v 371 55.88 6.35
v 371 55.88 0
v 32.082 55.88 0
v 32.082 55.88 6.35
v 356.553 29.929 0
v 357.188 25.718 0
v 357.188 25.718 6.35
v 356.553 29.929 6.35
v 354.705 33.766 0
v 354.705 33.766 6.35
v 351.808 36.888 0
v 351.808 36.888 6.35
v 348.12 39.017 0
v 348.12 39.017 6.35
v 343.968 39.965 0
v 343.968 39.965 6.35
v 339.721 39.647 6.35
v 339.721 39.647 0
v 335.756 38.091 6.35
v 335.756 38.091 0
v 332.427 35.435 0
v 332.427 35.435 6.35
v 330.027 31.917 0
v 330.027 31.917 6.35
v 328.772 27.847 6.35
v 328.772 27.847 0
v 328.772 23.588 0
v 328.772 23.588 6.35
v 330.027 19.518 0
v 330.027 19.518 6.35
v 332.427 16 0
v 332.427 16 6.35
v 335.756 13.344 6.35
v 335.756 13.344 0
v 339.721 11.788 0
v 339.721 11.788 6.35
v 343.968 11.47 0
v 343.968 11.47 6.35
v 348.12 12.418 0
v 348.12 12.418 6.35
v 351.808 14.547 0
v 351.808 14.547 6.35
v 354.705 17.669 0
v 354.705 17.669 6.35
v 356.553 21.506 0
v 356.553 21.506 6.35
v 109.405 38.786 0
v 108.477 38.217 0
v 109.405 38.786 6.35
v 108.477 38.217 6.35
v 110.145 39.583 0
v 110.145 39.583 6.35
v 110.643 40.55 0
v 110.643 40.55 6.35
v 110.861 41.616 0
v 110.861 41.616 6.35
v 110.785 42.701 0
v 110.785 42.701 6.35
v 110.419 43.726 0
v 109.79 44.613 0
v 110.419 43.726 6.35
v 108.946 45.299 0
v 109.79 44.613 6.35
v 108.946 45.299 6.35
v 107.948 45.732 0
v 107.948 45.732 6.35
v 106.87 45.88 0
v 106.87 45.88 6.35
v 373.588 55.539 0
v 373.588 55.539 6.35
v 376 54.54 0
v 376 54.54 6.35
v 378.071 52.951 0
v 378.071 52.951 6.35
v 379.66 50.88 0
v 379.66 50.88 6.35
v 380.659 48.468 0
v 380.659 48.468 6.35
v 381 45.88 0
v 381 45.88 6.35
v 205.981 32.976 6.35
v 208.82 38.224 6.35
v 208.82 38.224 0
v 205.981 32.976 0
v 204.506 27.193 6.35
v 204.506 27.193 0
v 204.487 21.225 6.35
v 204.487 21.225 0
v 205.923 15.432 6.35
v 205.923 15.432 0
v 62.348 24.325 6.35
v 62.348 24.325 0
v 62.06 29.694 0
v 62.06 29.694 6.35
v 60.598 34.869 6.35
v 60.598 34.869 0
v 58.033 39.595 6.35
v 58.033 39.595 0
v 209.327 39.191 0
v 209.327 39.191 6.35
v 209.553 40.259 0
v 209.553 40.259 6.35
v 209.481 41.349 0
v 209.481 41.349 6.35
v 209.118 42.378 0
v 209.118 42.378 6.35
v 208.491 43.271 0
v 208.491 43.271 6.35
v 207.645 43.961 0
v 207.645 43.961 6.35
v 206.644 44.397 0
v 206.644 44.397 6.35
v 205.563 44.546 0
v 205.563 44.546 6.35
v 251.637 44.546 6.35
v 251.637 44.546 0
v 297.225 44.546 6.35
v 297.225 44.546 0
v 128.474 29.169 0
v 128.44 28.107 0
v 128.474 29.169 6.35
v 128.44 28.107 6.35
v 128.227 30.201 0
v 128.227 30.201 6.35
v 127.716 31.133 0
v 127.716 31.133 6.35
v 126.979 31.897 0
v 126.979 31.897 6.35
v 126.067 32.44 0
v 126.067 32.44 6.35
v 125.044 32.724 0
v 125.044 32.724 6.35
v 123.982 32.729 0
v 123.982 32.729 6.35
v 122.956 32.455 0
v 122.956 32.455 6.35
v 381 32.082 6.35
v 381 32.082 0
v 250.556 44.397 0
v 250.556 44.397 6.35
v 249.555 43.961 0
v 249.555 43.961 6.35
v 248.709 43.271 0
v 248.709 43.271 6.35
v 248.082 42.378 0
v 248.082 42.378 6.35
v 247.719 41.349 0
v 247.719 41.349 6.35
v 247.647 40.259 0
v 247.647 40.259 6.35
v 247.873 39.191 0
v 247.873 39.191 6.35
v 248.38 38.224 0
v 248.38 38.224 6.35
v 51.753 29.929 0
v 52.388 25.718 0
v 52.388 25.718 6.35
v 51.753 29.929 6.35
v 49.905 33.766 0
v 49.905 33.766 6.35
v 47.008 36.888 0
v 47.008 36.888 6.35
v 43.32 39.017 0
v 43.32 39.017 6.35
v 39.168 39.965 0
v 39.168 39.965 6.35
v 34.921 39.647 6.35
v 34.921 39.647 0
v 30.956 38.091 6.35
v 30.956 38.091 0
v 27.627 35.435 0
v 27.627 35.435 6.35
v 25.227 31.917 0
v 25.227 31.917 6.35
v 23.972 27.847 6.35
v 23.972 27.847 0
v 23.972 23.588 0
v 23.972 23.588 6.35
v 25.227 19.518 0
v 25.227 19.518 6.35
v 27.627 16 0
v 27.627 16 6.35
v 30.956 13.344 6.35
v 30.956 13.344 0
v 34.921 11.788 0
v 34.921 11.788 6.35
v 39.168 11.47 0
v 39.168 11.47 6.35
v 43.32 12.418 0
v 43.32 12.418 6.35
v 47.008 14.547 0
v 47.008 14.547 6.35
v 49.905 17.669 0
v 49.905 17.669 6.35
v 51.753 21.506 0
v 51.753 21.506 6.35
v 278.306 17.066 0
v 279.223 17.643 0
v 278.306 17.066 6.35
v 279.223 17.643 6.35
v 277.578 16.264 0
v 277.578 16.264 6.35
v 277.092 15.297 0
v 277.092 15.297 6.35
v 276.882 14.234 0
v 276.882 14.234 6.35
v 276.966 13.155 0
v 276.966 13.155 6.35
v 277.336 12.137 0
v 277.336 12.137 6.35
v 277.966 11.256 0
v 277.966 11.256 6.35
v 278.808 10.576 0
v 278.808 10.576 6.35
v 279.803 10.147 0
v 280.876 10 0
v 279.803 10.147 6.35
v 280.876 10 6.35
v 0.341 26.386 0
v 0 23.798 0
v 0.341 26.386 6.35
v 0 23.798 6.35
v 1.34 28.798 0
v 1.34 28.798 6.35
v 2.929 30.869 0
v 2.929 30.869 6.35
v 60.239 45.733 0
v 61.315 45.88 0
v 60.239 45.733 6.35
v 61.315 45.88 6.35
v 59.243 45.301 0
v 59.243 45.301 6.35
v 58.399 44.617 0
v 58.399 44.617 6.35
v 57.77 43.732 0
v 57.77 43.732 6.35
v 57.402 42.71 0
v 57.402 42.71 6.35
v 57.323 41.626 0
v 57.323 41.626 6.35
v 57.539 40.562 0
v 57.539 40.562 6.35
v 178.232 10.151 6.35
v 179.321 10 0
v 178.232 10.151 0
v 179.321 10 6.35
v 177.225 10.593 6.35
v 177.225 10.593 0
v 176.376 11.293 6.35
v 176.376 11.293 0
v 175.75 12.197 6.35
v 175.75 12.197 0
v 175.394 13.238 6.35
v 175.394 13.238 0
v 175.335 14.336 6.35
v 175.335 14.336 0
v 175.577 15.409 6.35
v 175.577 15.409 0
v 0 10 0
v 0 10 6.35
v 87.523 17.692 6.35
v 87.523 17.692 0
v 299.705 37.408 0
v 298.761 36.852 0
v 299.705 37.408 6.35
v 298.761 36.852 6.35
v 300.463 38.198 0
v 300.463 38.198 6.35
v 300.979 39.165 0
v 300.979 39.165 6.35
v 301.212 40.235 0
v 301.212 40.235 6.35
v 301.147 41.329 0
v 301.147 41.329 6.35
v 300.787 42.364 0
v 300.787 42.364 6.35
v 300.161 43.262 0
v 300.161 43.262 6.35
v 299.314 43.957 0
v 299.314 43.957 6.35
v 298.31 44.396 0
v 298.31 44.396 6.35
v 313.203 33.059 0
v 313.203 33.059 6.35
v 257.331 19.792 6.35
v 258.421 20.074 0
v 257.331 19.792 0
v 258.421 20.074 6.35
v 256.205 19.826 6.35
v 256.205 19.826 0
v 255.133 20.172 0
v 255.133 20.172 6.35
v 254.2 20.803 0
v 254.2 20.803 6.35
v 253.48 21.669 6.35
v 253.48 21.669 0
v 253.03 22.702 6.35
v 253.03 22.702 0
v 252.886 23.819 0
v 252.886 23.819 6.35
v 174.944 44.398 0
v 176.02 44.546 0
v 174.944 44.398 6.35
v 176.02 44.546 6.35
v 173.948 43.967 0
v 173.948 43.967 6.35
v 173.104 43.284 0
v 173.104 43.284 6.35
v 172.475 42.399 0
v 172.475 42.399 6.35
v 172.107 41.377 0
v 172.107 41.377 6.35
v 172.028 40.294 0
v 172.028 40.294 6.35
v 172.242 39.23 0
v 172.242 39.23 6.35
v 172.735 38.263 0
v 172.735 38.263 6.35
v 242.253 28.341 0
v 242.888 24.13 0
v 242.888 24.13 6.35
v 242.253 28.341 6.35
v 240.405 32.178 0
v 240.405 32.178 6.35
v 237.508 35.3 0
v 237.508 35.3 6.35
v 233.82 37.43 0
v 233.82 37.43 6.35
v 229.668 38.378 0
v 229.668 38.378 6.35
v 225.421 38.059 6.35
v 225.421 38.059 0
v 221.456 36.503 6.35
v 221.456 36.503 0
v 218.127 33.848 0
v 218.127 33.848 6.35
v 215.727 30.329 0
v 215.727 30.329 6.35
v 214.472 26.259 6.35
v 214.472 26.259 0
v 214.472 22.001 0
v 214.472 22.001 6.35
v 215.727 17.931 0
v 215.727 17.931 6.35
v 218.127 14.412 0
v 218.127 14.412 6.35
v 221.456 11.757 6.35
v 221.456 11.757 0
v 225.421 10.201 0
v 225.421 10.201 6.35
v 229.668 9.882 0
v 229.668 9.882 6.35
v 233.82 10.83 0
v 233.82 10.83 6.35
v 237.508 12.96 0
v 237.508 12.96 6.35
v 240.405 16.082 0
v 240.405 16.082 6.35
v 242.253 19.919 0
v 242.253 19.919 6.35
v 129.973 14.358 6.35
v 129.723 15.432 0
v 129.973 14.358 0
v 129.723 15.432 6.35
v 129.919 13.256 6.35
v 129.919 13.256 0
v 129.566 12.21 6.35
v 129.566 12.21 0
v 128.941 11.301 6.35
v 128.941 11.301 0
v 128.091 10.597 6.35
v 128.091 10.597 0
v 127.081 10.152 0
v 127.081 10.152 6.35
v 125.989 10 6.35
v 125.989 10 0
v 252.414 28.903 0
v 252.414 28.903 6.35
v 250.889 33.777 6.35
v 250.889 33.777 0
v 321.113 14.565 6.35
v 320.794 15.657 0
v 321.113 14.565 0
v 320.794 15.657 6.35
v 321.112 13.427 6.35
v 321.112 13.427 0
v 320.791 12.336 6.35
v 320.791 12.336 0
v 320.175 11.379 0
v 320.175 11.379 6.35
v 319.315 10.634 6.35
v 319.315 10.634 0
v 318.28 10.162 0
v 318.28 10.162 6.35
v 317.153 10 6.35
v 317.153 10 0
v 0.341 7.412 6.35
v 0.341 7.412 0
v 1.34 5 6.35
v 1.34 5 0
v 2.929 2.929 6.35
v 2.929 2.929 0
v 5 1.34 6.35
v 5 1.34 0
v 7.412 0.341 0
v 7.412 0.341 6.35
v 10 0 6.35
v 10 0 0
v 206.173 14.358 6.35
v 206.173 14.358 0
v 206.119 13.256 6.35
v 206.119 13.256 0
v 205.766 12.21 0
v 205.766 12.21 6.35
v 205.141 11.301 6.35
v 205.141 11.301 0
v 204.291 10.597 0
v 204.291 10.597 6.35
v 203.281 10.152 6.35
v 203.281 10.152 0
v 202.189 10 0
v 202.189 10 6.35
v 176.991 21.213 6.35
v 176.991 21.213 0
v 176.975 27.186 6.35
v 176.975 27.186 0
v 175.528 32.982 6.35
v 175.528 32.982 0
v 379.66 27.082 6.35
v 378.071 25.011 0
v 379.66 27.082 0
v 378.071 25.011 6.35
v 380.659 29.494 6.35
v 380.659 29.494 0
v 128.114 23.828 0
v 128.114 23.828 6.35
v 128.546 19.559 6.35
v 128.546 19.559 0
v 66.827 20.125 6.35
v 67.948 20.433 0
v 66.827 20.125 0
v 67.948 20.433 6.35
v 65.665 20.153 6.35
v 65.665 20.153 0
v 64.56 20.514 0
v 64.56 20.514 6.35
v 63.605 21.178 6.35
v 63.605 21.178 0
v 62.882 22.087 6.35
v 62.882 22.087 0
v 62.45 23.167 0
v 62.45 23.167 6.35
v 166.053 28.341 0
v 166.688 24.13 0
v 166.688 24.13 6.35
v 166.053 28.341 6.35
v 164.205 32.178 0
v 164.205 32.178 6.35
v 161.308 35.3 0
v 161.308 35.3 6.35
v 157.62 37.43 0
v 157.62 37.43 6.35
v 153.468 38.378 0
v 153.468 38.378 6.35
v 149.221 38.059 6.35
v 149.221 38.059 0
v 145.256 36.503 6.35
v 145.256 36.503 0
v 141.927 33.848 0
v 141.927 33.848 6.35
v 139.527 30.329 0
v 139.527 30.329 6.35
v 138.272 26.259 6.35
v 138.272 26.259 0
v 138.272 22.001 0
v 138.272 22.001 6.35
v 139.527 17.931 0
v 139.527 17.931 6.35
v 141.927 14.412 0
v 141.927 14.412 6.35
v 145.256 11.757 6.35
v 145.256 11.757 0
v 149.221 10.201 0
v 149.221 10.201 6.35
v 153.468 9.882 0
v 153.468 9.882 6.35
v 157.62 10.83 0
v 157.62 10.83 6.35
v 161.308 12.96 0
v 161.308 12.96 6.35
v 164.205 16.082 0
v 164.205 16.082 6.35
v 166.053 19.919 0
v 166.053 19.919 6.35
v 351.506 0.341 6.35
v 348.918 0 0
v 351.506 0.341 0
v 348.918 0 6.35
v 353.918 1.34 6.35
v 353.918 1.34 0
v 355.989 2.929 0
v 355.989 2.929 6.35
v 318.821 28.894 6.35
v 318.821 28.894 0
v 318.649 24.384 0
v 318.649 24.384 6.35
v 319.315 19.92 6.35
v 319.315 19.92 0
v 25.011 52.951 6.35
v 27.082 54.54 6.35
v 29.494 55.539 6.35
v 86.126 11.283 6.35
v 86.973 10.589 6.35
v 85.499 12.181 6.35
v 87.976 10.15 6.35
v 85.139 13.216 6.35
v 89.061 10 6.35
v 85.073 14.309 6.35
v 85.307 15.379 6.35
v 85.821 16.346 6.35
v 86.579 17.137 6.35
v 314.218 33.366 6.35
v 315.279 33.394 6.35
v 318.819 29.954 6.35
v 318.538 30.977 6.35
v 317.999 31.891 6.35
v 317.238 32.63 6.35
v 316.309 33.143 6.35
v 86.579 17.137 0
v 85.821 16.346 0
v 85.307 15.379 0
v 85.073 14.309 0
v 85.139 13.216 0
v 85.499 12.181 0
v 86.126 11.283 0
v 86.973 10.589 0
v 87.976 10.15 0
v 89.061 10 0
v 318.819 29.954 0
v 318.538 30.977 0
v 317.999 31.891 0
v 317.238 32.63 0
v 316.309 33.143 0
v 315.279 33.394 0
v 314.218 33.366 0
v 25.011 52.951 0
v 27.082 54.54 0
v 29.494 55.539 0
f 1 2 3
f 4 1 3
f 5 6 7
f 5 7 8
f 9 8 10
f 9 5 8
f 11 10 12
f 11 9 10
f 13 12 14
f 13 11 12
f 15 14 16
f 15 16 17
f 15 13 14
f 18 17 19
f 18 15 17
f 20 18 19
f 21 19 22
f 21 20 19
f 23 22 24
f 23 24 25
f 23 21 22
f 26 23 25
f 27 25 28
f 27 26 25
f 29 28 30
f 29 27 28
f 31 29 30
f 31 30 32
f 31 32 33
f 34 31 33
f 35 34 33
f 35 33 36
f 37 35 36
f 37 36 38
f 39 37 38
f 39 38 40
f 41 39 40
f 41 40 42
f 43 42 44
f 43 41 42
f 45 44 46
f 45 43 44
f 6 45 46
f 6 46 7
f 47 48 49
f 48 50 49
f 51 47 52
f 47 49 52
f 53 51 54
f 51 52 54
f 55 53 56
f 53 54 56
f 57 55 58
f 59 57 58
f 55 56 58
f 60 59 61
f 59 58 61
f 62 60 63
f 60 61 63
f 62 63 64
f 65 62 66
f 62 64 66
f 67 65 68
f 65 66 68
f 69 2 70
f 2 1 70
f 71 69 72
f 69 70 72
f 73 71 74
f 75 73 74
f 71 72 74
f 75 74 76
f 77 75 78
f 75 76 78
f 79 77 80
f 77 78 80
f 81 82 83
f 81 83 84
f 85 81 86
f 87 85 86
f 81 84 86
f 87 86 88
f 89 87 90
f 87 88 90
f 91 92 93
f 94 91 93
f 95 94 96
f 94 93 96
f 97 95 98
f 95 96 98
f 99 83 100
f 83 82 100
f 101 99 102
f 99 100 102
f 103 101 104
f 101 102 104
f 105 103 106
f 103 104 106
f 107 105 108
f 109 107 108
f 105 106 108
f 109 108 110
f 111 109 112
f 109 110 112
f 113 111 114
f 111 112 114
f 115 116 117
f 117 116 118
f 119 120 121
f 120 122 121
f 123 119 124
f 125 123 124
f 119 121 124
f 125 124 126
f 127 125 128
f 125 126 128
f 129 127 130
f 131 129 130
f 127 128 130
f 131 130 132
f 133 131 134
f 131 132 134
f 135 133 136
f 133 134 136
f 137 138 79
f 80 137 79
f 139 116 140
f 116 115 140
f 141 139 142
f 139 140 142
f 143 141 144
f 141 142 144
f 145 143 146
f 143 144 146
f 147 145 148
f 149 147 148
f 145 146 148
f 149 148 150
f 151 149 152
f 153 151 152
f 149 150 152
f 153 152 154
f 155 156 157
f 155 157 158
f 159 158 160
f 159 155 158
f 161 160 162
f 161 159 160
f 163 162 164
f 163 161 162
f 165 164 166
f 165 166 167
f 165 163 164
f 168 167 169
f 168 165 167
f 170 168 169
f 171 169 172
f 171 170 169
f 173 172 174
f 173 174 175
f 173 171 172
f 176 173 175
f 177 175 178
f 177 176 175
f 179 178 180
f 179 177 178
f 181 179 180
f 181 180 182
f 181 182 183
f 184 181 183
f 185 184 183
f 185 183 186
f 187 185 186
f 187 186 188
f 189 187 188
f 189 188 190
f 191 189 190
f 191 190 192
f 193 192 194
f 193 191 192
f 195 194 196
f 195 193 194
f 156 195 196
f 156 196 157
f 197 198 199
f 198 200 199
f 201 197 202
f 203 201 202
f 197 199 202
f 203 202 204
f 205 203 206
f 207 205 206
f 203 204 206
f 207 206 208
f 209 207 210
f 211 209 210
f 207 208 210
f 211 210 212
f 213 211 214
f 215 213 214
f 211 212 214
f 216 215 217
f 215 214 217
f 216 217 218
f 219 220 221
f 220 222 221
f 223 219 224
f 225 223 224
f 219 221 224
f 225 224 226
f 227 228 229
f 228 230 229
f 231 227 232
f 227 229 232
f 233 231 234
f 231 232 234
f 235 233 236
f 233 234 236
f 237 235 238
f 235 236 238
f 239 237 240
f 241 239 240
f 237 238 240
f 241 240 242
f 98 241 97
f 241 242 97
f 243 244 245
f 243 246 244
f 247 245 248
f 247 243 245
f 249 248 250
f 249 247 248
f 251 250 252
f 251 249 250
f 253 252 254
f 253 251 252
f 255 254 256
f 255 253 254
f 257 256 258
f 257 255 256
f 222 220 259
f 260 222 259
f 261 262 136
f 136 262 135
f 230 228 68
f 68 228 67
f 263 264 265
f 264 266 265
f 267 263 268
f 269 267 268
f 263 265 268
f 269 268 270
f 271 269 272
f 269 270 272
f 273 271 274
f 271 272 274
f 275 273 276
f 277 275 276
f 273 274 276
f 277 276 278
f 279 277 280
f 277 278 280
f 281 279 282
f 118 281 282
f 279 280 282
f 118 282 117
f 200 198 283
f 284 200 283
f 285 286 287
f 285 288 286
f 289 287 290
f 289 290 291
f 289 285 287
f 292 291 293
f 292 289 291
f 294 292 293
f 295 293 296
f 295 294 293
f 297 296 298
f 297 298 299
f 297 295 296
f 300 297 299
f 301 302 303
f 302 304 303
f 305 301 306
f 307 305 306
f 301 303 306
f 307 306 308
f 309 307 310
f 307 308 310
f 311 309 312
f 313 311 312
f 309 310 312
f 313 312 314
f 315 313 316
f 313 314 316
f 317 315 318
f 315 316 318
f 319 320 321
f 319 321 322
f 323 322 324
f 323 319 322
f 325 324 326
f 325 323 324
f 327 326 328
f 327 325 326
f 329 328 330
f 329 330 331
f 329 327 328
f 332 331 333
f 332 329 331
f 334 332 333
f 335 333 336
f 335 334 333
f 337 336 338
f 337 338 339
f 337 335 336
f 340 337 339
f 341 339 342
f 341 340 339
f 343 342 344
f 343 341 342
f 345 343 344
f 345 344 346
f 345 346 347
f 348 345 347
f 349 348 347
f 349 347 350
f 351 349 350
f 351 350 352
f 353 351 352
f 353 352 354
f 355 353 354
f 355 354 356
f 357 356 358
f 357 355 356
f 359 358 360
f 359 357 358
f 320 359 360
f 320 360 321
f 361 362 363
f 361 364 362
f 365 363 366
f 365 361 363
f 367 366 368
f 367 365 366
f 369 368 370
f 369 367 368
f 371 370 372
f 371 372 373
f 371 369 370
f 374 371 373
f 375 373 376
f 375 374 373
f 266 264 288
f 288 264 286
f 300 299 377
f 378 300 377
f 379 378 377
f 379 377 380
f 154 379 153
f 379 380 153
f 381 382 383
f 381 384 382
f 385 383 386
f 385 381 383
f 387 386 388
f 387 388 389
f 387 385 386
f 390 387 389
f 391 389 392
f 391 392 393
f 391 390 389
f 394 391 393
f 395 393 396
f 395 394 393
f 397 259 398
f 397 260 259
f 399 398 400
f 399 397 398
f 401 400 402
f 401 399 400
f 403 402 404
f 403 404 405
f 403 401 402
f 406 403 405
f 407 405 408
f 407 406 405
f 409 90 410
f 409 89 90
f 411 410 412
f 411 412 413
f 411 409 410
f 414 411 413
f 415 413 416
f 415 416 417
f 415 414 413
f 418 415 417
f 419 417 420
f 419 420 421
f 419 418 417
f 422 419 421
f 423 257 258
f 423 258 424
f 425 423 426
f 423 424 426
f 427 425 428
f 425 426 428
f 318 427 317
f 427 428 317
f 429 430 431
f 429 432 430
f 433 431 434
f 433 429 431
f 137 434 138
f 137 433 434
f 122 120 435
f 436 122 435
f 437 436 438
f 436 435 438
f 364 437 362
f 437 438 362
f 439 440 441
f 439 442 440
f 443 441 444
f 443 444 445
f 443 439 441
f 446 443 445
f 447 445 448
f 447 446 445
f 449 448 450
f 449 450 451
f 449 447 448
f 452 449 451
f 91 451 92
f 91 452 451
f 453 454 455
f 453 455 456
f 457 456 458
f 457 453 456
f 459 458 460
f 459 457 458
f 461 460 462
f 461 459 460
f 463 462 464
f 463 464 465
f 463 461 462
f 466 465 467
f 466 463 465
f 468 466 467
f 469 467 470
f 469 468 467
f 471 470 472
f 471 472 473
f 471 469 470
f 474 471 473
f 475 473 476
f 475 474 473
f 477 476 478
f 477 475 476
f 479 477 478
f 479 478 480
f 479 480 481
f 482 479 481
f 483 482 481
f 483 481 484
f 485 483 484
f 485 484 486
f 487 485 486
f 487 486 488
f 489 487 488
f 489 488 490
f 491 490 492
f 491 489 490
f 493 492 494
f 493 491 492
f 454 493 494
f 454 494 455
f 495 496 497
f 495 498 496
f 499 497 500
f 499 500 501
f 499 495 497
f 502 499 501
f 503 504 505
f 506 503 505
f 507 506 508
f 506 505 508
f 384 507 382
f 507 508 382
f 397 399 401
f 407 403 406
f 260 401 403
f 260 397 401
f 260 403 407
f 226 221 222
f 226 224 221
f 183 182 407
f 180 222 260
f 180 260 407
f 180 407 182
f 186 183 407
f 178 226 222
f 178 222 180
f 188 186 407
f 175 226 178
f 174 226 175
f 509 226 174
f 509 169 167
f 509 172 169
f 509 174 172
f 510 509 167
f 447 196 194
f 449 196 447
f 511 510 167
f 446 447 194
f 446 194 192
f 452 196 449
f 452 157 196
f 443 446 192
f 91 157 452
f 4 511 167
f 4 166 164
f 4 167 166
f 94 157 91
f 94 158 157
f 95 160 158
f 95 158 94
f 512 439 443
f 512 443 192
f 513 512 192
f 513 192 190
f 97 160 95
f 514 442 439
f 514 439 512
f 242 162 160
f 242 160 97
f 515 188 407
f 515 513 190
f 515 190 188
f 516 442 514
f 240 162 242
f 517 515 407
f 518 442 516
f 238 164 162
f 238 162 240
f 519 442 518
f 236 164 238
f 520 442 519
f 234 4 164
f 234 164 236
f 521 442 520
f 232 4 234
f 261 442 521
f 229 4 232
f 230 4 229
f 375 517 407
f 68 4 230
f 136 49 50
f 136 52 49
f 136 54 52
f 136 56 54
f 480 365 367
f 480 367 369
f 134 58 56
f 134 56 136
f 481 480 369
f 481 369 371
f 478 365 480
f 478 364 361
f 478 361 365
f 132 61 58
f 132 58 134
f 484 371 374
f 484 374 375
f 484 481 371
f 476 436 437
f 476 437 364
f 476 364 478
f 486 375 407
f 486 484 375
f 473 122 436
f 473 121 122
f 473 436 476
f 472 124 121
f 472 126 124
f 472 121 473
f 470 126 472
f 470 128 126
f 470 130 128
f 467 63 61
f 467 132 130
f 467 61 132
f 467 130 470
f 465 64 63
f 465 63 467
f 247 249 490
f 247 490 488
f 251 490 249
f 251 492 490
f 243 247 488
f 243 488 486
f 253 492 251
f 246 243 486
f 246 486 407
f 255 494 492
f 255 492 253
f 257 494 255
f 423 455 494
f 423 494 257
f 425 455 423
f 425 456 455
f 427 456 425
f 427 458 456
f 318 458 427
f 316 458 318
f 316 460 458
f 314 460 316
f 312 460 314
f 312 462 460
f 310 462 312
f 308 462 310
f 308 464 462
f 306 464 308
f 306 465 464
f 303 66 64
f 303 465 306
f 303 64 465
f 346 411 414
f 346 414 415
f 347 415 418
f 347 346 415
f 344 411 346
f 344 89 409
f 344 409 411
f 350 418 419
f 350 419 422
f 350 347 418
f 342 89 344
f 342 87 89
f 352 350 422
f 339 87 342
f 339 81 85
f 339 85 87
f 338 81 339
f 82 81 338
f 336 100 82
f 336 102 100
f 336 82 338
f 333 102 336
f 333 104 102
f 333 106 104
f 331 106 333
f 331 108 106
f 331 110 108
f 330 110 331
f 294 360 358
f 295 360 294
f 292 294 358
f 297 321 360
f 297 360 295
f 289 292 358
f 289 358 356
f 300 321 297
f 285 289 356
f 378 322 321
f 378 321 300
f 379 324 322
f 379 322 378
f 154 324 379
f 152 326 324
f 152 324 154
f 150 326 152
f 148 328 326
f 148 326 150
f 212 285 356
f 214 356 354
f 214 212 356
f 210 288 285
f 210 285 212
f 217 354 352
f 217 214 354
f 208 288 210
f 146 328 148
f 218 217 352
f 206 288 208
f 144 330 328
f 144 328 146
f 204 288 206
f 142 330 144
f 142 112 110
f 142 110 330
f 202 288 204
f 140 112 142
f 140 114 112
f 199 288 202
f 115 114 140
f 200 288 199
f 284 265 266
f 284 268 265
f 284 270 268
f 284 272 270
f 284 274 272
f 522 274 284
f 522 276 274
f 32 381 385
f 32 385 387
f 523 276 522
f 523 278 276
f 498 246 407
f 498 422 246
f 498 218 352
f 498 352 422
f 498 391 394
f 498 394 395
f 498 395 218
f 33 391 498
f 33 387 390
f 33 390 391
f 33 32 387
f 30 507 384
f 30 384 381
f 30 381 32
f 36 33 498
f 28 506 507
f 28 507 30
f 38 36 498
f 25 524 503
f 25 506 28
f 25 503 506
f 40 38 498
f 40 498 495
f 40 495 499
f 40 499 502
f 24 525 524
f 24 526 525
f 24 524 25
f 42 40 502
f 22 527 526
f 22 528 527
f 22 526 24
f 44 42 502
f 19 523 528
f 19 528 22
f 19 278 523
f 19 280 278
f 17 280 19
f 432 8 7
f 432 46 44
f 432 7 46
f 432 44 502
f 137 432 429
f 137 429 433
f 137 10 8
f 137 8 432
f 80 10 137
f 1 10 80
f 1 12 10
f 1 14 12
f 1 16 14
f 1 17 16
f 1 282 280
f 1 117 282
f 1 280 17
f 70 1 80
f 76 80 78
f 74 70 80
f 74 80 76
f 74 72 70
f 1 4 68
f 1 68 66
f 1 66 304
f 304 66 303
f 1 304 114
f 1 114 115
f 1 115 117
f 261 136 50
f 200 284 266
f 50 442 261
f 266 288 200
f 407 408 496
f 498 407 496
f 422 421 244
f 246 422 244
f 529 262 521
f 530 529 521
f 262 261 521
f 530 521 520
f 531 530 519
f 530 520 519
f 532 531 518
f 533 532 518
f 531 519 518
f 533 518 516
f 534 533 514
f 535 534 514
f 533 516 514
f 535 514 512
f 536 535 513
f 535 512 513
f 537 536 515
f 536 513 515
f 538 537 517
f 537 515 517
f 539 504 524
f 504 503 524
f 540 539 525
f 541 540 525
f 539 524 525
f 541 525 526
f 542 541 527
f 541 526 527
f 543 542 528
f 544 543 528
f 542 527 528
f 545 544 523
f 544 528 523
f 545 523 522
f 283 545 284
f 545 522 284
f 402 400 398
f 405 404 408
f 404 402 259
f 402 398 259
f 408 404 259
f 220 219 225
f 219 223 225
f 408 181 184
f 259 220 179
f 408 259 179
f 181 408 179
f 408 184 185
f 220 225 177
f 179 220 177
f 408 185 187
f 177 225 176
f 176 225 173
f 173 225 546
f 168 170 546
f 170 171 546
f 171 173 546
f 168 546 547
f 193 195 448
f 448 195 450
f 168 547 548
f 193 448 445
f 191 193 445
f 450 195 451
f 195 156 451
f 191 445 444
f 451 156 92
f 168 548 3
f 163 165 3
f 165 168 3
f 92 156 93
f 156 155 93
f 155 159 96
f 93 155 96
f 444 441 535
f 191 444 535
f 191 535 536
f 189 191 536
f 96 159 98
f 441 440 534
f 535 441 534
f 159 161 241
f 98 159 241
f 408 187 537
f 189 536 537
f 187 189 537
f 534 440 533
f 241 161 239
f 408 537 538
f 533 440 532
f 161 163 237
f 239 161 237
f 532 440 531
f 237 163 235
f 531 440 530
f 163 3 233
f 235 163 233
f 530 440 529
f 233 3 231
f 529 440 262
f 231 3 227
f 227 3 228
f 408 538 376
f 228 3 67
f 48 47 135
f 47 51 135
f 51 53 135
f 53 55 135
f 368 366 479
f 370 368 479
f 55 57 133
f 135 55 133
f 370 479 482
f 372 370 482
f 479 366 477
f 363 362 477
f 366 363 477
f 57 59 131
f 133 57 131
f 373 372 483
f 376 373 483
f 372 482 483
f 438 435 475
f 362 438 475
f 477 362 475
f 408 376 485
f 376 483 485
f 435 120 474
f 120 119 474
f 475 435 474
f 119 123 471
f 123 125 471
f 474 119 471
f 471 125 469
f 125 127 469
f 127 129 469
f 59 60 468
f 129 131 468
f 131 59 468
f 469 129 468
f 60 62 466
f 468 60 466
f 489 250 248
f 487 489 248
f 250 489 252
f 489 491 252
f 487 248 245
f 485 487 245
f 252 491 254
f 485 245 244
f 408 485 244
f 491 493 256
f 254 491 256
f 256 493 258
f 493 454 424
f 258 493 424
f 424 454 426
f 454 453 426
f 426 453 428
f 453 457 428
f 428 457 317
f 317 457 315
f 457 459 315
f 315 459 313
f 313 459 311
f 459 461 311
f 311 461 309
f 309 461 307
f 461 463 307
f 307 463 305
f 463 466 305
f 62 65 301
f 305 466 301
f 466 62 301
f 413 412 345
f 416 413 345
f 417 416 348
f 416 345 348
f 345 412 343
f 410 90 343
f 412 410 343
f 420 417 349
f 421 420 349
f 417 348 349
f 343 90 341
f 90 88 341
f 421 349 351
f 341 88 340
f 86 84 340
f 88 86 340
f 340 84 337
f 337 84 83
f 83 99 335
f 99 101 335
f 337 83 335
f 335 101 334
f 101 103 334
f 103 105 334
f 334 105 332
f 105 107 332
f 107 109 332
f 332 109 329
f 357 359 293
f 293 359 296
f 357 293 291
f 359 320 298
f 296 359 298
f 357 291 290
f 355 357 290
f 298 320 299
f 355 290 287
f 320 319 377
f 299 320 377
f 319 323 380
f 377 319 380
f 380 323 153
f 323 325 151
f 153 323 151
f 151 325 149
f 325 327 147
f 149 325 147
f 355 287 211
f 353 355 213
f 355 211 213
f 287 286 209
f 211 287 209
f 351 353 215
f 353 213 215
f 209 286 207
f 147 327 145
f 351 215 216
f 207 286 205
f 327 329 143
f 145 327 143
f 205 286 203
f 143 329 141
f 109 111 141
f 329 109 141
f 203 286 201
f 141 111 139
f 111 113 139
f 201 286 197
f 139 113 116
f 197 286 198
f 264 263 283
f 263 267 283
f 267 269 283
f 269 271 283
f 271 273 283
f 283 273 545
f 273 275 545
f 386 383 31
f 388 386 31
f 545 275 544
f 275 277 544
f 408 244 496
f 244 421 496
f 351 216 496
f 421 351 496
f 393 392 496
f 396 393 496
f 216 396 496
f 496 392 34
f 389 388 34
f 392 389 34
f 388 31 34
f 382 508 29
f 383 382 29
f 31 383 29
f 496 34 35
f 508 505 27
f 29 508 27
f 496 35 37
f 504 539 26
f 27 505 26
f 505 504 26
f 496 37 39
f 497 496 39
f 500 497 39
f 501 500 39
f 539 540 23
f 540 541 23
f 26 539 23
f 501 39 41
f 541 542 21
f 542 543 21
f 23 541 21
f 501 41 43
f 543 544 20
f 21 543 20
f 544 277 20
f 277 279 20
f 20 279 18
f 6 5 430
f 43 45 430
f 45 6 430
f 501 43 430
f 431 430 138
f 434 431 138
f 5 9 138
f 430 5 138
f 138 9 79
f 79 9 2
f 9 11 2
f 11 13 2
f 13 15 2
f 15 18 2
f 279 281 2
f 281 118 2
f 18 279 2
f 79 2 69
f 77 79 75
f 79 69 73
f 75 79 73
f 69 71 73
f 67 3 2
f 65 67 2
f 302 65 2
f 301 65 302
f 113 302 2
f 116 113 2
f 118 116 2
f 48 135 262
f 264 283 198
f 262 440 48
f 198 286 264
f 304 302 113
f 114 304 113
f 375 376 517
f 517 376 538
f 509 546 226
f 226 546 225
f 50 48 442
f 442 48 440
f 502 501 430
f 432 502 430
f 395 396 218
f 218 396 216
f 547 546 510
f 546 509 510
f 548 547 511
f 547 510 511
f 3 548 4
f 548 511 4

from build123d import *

# Parameters (mm, degrees)
SKETCH1_R           = 14.2875
BOSS_EXTRUDE1_DEPTH = 6.35
FILLET1_R           = 10
FILLET2_R           = 4
FILLET3_R           = 4


with BuildPart() as part:
    # Sketch1 → Boss-Extrude1 (new body)
    with BuildSketch(Plane.XY):
        Polygon((0, 27.94), (0, 0), (353.06, 0), (363.06, 10), (381, 27.94), (381, 55.88), (27.94, 55.88), align=None)
        with Locations((38.1, 25.7175)):
            Circle(SKETCH1_R, mode=Mode.SUBTRACT)
        with BuildLine():
            Line((132.645867363, 10), (69.059384531, 10))
            Line((69.059384531, 10), (131.13384809, 35.861727885))
            ThreePointArc((131.13384809, 35.861727885), (128.153903852, 22.712439471), (132.645867363, 10))
        make_face(mode=Mode.SUBTRACT)
        with Locations((152.4, 24.13)):
            Circle(SKETCH1_R, mode=Mode.SUBTRACT)
        with Locations((228.6, 24.13)):
            Circle(SKETCH1_R, mode=Mode.SUBTRACT)
        with BuildLine():
            Line((208.845867363, 10), (172.736964373, 10))
            ThreePointArc((172.736964373, 10), (176.759470296, 28.58704238), (166.416173693, 44.54557971))
            Line((166.416173693, 44.54557971), (215.443755804, 44.54557971))
            ThreePointArc((215.443755804, 44.54557971), (204.743711621, 28.686331972), (208.845867363, 10))
        make_face(mode=Mode.SUBTRACT)
        with BuildLine():
            Line((324.38398396, 10), (262.377905487, 10))
            Line((262.377905487, 10), (321.240476687, 36.706026112))
            ThreePointArc((321.240476687, 36.706026112), (318.779024724, 22.878273345), (324.38398396, 10))
        make_face(mode=Mode.SUBTRACT)
        with Locations((342.9, 25.7175)):
            Circle(SKETCH1_R, mode=Mode.SUBTRACT)
        with BuildLine():
            ThreePointArc((60.896352165, 17.338419846), (61.203129855, 33.209365398), (51.640910235, 45.88))
            Line((51.640910235, 45.88), (125.940457816, 45.88))
            Line((125.940457816, 45.88), (60.896352165, 17.338419846))
        make_face(mode=Mode.SUBTRACT)
        with BuildLine():
            ThreePointArc((251.928870535, 17.373783913), (251.345714342, 32.645581912), (241.756244196, 44.54557971))
            Line((241.756244196, 44.54557971), (317.257409157, 44.54557971))
            Line((317.257409157, 44.54557971), (251.928870535, 17.373783913))
        make_face(mode=Mode.SUBTRACT)
    extrude(amount=BOSS_EXTRUDE1_DEPTH)

    # Fillet1
    fillet1_edges = [part.edges().sort_by_distance(p)[0] for p in [
        (0, 0, 3.175),
        (0, 27.94, 3.175),
        (27.94, 55.88, 3.175),
        (381, 55.88, 3.175),
        (381, 27.94, 3.175),
        (353.06, 0, 3.175),
    ]]
    fillet(fillet1_edges, radius=FILLET1_R)

    # Fillet2
    fillet2_edges = [part.edges().sort_by_distance(p)[0] for p in [
        (208.845867363, 10, 3.175),
        (215.443755804, 44.54557971, 3.175),
        (166.416173693, 44.54557971, 3.175),
        (172.736964373, 10, 3.175),
        (69.059384531, 10, 3.175),
        (131.13384809, 35.861727885, 3.175),
        (125.940457816, 45.88, 3.175),
        (60.896352165, 17.338419846, 3.175),
        (251.928870535, 17.373783913, 3.175),
        (317.257409157, 44.54557971, 3.175),
        (321.240476687, 36.706026112, 3.175),
        (262.377905487, 10, 3.175),
    ]]
    fillet(fillet2_edges, radius=FILLET2_R)

    # Fillet3
    fillet3_edges = [part.edges().sort_by_distance(p)[0] for p in [
        (132.645867363, 10, 3.175),
        (51.640910235, 45.88, 3.175),
        (241.756244196, 44.54557971, 3.175),
        (324.38398396, 10, 3.175),
    ]]
    fillet(fillet3_edges, radius=FILLET3_R)


solid = part.part
